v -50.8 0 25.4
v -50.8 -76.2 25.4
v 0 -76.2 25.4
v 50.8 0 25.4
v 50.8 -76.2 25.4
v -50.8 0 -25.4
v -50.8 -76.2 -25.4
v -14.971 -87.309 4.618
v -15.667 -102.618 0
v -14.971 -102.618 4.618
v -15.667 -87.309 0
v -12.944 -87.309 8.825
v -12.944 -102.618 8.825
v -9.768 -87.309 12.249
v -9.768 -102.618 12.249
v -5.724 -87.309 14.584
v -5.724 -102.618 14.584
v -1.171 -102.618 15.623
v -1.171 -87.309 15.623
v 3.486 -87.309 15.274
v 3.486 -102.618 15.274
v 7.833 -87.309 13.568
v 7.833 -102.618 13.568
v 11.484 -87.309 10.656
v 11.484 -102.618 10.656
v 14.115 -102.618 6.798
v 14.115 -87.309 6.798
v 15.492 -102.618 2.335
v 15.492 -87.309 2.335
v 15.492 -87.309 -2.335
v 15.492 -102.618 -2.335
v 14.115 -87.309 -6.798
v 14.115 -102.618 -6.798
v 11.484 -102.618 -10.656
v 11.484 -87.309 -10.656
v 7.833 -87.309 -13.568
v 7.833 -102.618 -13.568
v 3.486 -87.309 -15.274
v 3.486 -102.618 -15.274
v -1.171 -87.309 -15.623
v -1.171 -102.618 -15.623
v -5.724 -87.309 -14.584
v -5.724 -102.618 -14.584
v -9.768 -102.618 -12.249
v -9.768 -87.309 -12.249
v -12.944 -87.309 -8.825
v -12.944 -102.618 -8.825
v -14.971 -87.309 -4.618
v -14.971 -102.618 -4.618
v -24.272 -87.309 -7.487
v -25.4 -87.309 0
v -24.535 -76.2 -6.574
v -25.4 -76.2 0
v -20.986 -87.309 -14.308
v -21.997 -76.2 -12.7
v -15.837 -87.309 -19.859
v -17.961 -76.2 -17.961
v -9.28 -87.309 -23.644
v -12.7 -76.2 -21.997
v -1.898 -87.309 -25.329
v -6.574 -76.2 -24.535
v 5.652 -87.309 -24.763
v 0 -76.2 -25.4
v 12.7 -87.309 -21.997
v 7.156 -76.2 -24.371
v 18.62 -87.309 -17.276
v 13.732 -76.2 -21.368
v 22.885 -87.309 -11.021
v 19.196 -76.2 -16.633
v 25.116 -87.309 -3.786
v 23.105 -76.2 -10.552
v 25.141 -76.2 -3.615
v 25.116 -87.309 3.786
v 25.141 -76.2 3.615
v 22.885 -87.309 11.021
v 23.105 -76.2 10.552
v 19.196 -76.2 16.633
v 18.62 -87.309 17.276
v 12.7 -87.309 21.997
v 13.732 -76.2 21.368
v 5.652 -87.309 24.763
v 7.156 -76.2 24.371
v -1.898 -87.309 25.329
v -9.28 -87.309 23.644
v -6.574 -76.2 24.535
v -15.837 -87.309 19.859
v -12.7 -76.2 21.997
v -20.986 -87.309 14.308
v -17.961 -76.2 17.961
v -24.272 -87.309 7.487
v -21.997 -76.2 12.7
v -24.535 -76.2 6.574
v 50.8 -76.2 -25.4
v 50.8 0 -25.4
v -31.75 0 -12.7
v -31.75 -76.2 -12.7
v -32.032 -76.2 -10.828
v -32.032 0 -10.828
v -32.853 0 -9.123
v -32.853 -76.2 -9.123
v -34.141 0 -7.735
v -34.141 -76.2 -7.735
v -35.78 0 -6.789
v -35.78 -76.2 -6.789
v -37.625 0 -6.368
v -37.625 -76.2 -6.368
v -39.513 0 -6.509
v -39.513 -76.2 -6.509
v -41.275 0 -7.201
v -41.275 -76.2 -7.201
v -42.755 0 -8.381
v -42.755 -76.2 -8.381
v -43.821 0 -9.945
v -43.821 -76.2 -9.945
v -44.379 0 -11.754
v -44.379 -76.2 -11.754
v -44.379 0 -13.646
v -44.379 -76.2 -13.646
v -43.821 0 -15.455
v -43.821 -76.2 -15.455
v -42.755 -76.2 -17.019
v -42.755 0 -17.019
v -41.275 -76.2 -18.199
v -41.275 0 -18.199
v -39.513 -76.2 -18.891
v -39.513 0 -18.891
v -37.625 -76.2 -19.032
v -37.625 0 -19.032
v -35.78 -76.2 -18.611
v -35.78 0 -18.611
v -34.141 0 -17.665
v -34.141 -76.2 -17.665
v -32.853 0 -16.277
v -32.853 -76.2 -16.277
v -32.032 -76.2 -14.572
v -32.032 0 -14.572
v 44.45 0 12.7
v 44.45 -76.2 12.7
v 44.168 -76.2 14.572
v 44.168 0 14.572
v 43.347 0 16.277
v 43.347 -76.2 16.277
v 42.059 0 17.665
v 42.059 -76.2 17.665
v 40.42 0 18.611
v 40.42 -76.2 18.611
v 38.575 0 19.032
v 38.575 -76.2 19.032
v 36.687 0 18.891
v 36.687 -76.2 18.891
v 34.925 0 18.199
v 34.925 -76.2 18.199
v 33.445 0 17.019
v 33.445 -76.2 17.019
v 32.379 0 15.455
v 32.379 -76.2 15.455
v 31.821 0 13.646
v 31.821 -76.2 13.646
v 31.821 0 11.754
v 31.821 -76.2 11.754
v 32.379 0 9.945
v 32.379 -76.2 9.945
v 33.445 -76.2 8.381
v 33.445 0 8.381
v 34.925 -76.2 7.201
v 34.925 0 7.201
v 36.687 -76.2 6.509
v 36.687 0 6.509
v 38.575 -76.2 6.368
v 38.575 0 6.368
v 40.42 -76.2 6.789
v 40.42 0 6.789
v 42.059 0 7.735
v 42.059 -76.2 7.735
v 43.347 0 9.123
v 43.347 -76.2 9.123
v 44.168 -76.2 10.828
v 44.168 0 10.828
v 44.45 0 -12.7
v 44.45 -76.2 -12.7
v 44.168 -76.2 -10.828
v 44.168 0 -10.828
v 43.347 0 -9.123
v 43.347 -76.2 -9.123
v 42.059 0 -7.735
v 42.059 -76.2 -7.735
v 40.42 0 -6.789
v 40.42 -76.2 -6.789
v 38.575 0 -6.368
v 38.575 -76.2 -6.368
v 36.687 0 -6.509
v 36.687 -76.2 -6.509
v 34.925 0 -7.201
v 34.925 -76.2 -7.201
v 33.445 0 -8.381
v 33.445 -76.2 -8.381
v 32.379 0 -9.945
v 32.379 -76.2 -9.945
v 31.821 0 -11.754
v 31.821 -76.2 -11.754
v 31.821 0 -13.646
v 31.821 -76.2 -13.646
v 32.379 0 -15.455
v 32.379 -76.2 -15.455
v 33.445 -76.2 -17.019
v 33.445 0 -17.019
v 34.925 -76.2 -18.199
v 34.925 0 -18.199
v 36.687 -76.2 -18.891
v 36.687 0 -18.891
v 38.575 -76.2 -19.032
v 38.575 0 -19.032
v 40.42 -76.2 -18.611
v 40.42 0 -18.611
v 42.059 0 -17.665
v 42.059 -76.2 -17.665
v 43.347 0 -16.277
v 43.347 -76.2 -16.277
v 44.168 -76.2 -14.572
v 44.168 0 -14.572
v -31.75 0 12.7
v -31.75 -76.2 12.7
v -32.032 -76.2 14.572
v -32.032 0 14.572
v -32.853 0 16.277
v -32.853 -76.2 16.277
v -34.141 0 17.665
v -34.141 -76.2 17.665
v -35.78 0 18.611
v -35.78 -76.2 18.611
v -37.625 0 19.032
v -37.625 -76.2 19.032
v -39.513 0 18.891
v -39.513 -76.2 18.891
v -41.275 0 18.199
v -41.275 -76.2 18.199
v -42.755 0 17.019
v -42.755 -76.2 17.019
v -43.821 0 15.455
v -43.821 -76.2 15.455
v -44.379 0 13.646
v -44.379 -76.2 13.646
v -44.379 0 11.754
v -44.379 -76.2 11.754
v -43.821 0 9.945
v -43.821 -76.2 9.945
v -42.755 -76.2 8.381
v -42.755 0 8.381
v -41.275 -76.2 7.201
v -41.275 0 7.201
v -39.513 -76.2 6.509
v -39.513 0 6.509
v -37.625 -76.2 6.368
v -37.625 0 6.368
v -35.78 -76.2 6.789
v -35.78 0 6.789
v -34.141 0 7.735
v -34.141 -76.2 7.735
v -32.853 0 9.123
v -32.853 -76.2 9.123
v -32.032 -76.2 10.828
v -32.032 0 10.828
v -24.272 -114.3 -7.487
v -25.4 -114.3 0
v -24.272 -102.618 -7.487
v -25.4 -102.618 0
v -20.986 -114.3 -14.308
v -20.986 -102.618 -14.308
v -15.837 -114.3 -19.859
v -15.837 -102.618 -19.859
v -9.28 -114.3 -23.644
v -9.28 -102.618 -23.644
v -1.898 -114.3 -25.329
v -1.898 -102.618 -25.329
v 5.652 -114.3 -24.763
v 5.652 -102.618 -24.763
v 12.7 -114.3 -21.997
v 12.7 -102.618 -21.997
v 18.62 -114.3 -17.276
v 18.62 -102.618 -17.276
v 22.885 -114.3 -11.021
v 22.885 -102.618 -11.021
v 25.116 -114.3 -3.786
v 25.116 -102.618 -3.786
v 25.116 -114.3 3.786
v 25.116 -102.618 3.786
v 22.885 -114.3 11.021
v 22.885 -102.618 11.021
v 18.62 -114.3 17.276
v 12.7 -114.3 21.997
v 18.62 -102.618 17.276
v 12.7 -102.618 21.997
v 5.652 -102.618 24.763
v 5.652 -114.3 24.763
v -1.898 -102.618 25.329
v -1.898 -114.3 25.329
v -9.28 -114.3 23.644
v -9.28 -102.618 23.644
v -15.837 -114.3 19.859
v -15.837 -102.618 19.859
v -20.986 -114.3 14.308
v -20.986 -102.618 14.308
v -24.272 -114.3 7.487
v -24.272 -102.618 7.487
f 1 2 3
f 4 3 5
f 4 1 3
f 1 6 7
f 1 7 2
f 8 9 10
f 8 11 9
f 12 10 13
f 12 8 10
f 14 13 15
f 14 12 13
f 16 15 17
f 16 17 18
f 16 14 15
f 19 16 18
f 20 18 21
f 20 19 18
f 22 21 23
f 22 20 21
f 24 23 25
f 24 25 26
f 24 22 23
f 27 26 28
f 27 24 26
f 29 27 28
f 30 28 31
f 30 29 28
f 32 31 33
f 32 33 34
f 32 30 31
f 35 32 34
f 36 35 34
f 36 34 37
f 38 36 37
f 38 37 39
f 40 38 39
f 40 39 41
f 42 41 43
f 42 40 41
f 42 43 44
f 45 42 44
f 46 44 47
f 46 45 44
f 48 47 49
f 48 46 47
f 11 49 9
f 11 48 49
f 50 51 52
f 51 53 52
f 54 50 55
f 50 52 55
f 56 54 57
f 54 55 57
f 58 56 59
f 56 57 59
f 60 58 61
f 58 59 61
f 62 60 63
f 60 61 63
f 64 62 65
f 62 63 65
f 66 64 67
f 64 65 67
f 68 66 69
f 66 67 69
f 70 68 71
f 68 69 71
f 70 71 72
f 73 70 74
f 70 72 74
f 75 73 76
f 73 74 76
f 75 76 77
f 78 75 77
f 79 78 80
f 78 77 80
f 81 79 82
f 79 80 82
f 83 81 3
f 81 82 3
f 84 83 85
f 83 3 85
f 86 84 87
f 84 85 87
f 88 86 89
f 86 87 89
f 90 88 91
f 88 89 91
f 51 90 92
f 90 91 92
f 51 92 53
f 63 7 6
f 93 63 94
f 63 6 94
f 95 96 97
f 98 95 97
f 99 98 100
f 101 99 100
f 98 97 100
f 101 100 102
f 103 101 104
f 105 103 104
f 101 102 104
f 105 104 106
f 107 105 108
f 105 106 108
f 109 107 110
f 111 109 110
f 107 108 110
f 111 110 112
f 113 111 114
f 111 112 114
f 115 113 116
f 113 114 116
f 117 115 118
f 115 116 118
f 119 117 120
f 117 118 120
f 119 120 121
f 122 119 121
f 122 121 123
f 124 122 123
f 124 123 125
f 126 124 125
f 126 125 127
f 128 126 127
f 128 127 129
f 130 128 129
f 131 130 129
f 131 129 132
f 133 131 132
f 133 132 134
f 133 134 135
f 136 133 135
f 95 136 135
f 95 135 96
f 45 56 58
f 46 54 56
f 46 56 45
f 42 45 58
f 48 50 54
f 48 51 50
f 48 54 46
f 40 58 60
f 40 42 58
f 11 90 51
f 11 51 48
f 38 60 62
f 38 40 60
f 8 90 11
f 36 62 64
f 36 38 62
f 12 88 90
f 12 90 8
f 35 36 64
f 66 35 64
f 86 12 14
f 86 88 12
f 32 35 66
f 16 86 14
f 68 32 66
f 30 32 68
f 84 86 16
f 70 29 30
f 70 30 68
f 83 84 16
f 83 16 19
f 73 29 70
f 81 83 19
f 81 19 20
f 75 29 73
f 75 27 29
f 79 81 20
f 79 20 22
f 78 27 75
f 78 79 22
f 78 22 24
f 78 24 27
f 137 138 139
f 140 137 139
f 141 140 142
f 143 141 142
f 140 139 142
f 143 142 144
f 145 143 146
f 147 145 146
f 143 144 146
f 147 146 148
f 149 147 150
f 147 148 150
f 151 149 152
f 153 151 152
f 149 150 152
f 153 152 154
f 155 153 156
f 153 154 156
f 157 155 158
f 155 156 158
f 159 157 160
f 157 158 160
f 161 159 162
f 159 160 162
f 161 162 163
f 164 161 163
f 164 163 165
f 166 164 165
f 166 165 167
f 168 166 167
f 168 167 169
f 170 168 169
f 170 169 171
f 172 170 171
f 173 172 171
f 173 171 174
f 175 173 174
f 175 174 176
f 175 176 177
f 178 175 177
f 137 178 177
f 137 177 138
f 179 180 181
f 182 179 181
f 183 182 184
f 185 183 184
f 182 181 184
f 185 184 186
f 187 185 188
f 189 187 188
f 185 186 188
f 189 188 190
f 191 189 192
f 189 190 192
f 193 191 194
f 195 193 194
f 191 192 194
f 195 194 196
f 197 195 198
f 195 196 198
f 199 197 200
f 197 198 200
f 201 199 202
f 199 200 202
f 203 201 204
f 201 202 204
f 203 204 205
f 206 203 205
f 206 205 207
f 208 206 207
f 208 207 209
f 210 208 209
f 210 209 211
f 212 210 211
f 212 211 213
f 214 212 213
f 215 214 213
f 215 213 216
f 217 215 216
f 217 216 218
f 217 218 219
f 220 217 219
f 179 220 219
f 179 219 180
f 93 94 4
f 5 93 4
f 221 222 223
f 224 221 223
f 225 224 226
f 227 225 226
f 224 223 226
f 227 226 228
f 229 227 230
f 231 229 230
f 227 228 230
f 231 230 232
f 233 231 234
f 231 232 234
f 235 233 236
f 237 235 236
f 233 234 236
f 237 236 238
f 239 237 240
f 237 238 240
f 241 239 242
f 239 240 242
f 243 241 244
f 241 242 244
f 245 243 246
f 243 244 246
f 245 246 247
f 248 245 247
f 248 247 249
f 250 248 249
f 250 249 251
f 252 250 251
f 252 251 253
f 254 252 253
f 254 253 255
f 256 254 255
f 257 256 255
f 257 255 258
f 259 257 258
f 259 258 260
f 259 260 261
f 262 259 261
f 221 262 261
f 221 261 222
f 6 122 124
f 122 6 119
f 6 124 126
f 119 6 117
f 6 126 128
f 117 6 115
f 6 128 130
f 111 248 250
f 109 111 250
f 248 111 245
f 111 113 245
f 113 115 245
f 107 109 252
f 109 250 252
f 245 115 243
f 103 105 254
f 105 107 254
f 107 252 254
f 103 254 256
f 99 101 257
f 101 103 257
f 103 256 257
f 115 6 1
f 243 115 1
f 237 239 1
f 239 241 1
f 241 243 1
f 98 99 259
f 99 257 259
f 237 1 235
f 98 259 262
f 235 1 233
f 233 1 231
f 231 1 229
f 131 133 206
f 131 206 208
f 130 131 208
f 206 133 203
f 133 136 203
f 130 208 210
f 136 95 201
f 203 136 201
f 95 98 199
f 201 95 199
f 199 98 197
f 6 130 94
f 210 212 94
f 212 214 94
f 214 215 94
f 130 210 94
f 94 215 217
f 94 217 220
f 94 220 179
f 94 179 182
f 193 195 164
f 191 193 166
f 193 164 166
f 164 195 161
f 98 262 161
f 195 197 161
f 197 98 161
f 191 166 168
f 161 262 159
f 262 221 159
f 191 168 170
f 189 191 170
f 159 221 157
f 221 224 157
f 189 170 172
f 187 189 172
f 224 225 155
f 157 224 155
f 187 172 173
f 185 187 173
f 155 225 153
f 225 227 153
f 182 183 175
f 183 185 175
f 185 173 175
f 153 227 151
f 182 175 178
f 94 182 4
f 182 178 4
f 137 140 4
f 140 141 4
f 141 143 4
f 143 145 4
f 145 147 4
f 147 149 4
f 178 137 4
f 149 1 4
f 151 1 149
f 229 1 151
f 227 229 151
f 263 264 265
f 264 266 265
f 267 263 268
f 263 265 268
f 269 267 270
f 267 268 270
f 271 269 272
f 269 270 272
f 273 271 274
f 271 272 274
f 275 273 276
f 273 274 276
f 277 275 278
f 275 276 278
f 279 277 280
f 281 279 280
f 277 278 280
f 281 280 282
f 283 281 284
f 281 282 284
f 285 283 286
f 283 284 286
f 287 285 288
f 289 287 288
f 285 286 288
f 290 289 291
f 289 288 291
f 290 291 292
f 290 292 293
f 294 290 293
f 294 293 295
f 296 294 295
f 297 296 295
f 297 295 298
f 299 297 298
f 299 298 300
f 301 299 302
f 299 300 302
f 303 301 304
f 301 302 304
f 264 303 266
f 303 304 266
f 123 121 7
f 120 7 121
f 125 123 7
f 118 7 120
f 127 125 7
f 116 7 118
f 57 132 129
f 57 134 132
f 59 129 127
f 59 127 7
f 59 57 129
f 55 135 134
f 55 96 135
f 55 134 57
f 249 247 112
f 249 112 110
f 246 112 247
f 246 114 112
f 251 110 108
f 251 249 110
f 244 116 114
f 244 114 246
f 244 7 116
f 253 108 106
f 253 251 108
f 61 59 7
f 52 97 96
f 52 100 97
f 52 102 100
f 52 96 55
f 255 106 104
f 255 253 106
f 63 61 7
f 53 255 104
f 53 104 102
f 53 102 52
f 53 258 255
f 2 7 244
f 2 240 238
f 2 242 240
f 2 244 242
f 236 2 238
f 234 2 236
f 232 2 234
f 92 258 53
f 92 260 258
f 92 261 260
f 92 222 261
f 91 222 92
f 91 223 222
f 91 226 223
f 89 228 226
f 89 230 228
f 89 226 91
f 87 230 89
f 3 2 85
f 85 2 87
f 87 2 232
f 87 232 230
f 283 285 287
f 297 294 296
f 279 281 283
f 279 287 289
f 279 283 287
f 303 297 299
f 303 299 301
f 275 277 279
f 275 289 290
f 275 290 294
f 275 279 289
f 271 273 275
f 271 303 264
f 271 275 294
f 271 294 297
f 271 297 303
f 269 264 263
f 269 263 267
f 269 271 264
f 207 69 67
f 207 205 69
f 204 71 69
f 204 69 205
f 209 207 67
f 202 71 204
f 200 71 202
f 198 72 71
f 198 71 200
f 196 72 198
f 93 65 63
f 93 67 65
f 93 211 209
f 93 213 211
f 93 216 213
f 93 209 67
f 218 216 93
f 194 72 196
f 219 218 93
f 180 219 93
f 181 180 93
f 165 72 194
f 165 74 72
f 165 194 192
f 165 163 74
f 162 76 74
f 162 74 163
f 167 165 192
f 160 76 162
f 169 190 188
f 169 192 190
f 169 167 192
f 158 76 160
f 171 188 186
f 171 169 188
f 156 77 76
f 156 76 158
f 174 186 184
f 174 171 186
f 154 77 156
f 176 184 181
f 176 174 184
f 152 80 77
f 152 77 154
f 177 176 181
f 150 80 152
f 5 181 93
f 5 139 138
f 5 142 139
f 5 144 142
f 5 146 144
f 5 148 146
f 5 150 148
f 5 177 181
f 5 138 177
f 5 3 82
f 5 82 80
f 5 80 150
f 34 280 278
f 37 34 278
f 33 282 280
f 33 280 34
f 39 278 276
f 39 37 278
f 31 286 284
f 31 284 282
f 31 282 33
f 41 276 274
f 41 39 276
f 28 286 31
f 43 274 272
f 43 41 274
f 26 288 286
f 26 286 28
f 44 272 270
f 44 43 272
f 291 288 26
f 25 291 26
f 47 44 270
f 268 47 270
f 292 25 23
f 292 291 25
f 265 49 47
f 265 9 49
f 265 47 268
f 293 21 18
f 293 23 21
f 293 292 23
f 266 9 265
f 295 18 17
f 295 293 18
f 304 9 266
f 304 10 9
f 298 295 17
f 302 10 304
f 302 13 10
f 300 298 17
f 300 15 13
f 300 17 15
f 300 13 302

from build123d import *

# Parameters (mm, degrees)
F0_W     = 101.6
F0_H     = 50.8
F1_DEPTH = 76.2
F2_R     = 6.35
F3_DEPTH = 76.201
F4_W     = 25.4
F4_H     = 38.1
F6_W     = 0.105277
F6_H     = 15.308836
F6_W_2   = 9.73333


with BuildPart() as f1:
    # F0 (on Front) → F1 (new body)
    with BuildSketch(Plane.XZ):
        Rectangle(F0_W, F0_H)
    extrude(amount=F1_DEPTH)

    # F2 (on face) → F3 (cut, through all)
    with BuildSketch(Plane.XZ.offset(76.2)):
        with Locations((-38.1, 12.7)):
            Circle(F2_R)
        with Locations((-38.1, -12.7)):
            Circle(F2_R)
        with Locations((38.1, 12.7)):
            Circle(F2_R)
        with Locations((38.1, -12.7)):
            Circle(F2_R)
    extrude(amount=-F3_DEPTH, mode=Mode.SUBTRACT)

    # F4 (on Top) → F5 (revolve)
    with BuildSketch(Plane.XY):
        with Locations((-12.7, -95.25)):
            Rectangle(F4_W, F4_H)
    revolve(axis=Axis((0, -95.25, 0), (0, -1, 0)))

    # F6 (on Top) → F7 (revolve, cut)
    with BuildSketch(Plane.XY):
        with Locations((-25.452638, -94.963487)):
            Rectangle(F6_W, F6_H)
        with Locations((-20.533335, -94.963487)):
            Rectangle(F6_W_2, F6_H)
    revolve(axis=Axis((0, -61.931949, 0), (0, 1, 0)), mode=Mode.SUBTRACT)


solid = f1.part
